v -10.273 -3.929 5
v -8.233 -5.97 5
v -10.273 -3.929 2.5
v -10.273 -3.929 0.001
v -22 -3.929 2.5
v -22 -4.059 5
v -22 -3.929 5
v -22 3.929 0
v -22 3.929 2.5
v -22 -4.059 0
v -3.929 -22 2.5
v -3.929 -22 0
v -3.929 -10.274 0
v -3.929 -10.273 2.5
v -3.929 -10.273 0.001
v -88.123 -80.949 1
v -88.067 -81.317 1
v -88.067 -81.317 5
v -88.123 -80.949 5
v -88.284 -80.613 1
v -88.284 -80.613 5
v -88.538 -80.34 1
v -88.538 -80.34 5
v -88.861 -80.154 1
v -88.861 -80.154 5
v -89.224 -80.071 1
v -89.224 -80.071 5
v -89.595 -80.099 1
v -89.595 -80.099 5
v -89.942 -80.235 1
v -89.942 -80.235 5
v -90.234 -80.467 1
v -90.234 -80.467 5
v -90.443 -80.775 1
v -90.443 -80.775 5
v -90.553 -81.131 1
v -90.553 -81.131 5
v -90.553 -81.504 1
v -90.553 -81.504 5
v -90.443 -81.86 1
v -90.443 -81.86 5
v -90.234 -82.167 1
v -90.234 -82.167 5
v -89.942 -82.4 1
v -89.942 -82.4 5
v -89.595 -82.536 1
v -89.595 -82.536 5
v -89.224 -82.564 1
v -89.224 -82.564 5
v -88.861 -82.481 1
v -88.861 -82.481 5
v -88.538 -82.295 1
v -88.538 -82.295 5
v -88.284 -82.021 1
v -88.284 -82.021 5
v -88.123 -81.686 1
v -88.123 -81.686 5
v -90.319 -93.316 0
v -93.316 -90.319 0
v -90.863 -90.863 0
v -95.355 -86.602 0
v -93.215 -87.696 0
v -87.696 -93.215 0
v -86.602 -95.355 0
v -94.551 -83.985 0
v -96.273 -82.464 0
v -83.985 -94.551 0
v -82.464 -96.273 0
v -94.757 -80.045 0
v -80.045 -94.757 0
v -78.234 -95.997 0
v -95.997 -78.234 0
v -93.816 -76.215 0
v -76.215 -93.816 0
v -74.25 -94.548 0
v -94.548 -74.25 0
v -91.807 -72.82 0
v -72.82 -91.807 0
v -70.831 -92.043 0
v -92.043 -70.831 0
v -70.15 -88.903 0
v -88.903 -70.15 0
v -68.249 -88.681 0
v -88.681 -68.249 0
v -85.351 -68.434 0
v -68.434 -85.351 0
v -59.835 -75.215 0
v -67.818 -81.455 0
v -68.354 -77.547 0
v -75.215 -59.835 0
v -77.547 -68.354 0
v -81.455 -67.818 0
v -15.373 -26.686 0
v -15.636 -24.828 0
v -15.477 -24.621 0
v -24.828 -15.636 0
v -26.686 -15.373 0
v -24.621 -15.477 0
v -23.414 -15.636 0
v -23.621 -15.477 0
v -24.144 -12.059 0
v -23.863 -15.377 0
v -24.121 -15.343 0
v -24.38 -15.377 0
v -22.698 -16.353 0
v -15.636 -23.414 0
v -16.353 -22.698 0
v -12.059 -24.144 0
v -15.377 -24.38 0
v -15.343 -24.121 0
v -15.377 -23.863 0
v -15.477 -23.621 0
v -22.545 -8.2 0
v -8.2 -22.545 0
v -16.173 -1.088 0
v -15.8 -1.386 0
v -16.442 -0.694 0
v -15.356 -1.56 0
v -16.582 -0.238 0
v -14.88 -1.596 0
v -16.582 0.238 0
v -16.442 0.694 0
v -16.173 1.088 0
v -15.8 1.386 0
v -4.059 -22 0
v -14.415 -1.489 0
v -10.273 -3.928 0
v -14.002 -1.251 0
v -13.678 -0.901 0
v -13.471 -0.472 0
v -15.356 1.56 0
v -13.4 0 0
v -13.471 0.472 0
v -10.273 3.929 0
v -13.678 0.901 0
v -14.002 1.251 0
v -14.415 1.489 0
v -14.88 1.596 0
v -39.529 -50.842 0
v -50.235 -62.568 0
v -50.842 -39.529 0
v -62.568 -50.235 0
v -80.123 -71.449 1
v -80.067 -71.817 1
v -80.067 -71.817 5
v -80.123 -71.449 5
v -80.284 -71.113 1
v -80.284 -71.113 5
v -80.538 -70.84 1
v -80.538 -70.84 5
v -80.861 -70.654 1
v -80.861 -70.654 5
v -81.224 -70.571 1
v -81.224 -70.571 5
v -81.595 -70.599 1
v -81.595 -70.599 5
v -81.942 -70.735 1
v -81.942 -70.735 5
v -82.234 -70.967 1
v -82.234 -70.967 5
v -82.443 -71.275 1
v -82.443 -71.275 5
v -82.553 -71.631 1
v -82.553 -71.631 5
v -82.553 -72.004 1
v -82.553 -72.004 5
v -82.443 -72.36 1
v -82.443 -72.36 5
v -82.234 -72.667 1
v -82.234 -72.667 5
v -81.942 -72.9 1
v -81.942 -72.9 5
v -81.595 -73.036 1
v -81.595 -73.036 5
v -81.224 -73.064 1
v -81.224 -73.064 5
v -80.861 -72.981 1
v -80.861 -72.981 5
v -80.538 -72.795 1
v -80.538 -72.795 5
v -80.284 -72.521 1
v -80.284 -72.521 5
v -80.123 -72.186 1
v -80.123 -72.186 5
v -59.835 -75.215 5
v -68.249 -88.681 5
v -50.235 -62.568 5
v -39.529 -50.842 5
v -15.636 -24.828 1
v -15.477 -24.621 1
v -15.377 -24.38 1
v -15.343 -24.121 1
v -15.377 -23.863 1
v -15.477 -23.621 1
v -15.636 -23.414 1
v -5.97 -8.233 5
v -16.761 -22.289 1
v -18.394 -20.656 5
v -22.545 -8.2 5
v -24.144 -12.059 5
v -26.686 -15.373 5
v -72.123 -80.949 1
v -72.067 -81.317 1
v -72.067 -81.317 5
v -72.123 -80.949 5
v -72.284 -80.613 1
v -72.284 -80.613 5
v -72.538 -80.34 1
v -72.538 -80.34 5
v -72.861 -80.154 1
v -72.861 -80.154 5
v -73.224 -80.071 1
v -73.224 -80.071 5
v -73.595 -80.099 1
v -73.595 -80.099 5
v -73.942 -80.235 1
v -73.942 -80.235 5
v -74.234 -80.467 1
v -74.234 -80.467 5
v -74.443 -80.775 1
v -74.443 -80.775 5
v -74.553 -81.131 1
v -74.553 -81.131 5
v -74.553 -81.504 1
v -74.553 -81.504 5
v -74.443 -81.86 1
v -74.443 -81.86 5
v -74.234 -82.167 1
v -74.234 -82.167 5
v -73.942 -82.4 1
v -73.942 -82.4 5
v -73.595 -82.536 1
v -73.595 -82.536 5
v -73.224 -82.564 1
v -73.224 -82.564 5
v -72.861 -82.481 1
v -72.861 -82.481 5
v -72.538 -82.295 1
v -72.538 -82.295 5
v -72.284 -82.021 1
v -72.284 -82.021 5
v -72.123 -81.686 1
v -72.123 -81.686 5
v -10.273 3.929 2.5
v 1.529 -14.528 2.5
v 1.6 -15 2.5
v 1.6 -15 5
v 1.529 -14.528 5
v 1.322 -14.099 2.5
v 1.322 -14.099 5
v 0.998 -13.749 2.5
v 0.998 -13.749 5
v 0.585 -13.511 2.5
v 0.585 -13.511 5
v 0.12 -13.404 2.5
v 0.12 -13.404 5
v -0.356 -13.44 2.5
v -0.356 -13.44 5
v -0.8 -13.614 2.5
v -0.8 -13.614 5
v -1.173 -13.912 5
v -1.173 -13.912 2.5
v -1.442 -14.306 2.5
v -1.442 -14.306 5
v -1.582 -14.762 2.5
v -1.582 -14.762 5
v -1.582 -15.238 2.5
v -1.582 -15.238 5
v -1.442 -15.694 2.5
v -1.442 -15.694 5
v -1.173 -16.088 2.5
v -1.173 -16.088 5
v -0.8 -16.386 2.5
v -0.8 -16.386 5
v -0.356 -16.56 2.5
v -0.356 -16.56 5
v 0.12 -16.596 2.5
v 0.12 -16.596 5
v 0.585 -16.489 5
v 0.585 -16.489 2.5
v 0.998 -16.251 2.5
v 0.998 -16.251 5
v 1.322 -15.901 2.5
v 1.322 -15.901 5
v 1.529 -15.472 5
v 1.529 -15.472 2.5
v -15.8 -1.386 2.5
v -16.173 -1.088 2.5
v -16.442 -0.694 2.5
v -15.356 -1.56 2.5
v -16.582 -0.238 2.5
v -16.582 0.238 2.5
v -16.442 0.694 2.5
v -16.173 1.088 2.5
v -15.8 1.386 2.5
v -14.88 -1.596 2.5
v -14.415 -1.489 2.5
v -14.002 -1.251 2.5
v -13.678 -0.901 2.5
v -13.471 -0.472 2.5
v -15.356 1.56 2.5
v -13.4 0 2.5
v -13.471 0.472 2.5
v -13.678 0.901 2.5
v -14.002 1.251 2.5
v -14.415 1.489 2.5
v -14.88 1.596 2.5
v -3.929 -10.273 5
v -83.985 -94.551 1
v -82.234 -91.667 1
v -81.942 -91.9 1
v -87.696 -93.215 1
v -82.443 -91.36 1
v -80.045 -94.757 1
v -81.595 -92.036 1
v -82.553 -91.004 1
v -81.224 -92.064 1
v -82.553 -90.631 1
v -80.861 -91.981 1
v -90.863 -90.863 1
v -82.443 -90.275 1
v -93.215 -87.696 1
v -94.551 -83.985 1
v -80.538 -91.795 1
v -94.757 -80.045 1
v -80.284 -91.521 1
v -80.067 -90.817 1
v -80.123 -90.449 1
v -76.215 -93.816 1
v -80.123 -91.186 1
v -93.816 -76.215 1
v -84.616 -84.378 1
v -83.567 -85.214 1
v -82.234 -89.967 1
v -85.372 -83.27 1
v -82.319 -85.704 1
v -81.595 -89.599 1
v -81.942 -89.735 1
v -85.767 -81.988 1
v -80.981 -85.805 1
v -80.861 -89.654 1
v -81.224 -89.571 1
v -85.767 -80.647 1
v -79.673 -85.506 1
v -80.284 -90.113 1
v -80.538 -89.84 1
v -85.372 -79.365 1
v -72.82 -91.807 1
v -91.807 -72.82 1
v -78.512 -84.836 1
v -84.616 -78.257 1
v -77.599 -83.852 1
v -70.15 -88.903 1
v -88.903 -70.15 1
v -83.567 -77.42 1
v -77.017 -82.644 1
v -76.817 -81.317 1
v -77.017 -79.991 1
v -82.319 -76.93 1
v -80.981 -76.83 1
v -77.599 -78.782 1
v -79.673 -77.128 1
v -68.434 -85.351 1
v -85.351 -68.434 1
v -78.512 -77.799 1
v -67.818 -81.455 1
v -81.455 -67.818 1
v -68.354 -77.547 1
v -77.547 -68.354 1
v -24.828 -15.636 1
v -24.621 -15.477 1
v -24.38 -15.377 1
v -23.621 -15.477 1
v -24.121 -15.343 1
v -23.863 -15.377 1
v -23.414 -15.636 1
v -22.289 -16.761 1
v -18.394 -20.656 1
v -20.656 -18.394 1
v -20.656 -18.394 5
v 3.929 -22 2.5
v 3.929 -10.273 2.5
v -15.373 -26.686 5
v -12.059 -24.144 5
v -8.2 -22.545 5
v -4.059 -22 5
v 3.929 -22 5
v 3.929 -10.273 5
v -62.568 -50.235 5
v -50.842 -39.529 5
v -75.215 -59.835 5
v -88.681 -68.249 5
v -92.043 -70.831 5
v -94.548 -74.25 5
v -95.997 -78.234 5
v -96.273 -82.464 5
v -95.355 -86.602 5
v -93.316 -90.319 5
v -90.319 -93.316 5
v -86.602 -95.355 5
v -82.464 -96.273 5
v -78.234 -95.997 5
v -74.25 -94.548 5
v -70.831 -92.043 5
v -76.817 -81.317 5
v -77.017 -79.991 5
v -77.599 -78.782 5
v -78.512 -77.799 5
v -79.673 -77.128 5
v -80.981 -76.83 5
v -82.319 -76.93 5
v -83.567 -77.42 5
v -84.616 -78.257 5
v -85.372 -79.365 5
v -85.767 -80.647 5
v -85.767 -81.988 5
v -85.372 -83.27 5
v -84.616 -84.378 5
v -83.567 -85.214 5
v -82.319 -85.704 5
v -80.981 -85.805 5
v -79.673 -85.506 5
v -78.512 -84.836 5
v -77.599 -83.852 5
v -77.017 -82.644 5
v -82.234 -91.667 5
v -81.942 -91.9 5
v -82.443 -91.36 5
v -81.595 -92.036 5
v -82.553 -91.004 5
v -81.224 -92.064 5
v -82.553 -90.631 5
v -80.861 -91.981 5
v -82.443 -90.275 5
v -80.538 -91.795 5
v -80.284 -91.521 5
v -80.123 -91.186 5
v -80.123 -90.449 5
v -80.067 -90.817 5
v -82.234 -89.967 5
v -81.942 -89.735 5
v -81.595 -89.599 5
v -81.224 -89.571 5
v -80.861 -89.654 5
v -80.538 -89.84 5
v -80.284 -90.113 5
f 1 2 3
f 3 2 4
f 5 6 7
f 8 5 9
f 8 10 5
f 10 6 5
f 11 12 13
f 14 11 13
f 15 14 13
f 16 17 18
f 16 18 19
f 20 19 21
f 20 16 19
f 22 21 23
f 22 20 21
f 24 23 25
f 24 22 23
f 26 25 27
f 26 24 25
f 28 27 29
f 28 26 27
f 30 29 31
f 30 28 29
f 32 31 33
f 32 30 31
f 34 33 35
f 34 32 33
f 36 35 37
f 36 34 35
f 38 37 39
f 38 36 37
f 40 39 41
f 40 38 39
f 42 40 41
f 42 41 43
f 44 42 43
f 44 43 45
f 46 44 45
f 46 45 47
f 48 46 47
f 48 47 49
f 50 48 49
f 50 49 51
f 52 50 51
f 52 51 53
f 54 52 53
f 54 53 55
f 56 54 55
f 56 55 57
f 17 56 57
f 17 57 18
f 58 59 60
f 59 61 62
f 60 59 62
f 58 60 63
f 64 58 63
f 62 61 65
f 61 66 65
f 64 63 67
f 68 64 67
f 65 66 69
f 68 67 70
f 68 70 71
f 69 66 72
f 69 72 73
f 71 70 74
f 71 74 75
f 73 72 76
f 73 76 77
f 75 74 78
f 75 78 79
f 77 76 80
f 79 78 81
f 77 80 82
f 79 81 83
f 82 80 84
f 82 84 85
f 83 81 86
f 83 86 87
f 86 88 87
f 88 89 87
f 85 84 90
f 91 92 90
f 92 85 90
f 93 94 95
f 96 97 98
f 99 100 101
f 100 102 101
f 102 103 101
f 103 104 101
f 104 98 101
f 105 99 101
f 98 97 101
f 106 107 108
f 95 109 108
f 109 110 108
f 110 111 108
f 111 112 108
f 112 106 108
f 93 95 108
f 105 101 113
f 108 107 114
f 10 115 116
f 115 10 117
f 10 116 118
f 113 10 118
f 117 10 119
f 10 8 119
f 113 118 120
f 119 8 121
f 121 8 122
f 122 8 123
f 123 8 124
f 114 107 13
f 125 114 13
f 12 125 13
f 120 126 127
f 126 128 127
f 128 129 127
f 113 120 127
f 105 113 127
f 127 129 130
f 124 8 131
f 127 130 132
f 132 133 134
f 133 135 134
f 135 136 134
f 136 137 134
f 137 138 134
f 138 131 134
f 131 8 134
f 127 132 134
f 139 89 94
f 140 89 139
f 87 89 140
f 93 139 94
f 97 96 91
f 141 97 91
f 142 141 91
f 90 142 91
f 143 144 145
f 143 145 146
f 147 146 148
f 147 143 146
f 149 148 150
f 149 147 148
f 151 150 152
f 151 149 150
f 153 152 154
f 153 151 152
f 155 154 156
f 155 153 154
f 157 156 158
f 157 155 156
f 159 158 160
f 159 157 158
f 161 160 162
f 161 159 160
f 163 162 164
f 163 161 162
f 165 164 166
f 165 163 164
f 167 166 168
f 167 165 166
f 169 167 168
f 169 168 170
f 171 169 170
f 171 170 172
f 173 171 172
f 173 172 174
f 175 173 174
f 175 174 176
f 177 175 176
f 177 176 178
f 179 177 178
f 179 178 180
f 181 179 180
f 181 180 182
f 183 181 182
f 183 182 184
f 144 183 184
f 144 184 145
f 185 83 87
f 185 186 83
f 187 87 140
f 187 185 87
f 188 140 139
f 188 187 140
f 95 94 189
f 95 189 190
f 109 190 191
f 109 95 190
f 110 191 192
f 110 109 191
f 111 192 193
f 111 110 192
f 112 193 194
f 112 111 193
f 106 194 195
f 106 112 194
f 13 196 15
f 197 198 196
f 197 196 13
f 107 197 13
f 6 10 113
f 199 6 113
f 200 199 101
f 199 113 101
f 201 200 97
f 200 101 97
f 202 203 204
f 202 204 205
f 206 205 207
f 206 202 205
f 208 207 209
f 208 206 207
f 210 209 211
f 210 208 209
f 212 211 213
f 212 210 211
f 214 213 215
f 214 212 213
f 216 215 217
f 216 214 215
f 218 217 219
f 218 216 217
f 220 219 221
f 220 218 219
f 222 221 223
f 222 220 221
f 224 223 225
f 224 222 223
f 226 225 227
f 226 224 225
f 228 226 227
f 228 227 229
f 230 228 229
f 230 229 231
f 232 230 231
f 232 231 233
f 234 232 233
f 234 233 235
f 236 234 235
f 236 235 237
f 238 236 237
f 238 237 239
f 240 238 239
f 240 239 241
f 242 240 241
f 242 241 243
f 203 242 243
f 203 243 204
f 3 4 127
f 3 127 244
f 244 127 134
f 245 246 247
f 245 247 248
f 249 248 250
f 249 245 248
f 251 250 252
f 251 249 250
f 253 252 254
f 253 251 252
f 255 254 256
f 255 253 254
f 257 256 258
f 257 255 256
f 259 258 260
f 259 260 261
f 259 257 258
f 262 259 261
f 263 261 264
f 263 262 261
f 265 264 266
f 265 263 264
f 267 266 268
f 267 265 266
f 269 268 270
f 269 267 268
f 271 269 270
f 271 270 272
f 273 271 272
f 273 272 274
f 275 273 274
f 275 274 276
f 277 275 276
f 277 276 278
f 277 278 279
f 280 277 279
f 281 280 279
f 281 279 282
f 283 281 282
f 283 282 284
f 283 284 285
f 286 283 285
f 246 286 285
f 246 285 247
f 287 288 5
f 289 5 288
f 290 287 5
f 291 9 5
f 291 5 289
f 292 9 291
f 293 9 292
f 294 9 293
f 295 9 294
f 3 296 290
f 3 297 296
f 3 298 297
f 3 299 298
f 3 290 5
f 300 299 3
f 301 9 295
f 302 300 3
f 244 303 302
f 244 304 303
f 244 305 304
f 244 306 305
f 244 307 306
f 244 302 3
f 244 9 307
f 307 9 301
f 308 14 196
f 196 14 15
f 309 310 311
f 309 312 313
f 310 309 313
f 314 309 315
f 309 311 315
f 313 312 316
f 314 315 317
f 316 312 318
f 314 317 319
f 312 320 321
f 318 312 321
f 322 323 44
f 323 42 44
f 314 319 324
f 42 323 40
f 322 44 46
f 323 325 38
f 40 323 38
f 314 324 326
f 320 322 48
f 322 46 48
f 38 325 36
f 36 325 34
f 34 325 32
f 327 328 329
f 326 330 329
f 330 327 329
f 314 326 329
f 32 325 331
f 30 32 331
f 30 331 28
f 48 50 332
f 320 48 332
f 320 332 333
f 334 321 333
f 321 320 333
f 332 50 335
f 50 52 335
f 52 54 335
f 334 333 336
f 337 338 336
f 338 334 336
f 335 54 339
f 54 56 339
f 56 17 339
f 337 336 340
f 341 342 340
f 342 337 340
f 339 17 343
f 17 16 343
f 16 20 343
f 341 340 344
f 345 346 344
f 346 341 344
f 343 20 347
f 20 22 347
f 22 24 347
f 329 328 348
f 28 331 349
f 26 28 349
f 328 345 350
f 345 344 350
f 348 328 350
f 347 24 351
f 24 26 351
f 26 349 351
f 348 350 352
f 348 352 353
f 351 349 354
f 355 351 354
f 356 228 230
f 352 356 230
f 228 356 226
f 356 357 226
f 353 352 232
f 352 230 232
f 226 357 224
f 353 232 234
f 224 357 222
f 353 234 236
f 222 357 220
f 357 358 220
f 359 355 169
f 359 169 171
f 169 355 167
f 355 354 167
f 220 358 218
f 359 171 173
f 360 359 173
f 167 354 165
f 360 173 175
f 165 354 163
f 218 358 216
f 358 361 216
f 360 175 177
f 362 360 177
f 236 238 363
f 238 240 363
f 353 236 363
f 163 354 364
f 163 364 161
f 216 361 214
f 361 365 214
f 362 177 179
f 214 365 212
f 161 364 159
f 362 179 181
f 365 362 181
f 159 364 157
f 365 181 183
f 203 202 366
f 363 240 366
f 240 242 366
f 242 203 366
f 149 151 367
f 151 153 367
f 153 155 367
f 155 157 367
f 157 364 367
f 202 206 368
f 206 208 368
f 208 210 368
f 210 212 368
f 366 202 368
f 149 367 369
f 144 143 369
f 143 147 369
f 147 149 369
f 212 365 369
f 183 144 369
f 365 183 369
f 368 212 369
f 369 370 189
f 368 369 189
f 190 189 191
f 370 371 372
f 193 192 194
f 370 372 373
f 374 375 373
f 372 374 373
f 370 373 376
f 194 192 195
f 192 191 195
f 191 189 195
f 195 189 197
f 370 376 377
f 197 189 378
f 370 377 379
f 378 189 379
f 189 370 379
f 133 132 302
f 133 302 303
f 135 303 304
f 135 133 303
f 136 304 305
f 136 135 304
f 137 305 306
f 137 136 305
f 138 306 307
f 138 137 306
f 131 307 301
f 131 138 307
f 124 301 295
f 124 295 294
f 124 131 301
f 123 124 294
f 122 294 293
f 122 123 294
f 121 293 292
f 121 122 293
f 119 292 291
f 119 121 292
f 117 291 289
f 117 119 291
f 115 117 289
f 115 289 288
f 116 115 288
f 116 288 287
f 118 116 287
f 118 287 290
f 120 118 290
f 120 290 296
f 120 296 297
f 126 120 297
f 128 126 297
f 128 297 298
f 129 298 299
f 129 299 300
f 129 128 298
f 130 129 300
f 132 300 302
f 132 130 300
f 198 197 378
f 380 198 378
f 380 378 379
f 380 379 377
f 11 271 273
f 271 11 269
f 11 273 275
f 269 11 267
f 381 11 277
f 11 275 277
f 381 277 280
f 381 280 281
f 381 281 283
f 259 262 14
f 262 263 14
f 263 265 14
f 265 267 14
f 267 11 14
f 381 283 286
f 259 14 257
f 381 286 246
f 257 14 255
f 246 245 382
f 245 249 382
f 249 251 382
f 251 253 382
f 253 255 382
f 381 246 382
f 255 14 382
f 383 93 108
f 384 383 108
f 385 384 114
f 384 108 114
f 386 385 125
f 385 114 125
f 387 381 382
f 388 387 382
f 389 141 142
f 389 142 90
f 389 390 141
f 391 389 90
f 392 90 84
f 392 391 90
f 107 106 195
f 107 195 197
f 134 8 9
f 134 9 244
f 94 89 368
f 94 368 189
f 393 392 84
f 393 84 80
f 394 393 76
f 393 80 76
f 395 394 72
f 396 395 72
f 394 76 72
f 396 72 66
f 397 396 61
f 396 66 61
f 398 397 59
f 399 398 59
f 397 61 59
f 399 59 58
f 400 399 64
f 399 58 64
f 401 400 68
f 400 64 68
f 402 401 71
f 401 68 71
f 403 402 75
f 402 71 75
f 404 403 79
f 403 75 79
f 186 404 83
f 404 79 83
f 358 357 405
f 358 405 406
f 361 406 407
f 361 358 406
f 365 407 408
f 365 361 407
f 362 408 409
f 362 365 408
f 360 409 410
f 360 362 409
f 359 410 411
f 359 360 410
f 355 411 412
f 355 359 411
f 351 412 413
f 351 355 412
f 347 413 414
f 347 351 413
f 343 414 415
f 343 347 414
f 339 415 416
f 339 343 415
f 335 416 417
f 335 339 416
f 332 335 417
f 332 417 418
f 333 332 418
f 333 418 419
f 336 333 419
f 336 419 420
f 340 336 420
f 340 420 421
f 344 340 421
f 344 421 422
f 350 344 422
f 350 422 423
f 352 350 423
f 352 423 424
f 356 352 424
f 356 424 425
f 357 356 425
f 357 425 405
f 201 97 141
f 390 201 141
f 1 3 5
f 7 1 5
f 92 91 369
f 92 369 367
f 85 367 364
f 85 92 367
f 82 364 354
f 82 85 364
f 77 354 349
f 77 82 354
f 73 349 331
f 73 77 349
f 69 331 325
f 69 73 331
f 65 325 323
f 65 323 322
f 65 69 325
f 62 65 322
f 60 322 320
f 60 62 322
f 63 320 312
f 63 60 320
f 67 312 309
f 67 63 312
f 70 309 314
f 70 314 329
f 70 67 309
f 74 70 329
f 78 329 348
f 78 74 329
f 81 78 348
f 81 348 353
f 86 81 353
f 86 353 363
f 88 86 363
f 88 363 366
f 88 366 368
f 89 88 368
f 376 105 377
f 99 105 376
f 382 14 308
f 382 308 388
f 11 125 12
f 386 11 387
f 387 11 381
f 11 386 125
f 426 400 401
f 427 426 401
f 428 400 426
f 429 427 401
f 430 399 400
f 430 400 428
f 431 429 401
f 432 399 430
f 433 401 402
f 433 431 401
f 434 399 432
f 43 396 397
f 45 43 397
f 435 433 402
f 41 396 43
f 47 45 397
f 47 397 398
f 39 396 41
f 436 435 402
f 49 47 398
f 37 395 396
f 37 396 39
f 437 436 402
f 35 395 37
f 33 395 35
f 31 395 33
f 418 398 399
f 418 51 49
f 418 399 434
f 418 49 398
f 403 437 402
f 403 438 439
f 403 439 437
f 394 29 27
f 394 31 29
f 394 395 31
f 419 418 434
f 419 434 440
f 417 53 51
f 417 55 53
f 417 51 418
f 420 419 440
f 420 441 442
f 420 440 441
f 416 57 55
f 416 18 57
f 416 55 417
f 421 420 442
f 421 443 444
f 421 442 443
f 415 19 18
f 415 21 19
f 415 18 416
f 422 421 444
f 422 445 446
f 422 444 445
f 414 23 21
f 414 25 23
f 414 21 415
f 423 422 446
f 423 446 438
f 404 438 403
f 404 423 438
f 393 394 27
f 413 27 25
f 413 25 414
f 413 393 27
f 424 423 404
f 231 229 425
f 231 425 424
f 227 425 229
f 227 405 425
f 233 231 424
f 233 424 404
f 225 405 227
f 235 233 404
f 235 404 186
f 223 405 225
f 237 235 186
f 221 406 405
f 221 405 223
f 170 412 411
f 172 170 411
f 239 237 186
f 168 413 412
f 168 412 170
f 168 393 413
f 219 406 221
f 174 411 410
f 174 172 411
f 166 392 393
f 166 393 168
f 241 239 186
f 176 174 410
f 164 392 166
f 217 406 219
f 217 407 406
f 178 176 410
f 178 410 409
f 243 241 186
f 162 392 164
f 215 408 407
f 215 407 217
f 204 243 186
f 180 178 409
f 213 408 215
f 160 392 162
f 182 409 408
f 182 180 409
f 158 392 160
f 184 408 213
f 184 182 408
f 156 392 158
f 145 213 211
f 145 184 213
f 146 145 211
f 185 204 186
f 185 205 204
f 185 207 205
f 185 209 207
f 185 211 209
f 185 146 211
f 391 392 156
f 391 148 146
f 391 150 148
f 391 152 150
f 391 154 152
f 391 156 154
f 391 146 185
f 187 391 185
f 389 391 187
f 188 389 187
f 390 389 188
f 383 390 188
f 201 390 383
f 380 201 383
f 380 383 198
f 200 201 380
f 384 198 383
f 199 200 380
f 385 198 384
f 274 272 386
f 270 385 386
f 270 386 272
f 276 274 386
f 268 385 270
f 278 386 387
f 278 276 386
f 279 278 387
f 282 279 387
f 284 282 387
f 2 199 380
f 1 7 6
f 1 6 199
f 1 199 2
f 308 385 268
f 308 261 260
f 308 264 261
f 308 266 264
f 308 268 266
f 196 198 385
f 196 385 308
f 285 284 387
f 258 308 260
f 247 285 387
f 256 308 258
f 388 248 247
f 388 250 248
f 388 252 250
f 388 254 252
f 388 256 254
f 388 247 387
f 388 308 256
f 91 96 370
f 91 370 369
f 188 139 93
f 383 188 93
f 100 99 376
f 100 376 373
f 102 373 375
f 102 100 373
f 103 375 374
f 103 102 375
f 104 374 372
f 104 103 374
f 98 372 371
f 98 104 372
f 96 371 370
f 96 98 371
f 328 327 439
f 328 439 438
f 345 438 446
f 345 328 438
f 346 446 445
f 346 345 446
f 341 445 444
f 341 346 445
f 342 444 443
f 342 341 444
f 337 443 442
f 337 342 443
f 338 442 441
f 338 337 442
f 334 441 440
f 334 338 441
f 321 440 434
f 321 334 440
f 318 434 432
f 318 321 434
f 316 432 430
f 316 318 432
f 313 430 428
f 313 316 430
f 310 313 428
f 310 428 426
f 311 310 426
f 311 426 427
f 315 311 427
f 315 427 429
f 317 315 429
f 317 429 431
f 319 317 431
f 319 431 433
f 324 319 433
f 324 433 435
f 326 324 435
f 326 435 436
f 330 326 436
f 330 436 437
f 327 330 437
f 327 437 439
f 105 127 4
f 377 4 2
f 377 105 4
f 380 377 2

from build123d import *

# Parameters (mm, degrees)
F0_R     = 1.25
F0_R_2   = 4.5
F1_DEPTH = 5
F0_W     = 11.7265549134
F0_H     = 7.858
F0_R_3   = 1.6
F2_DEPTH = 2.5
F0_W_2   = 7.858
F0_H_2   = 11.7265549134
F3_DEPTH = 5
F4_DEPTH = 2.5
F5_DEPTH = 1
F6_R     = 175
F8_DEPTH = 25


# Not quite as in the source:
# - a feature names something its author has since deleted; it is built from what else it names


with BuildPart() as f1:
    # F0 (on Top) → F1 (new body)
    with BuildSketch(Plane.XY):
        with BuildLine():
            Line((-10.2734450866, -3.929), (-22, -3.929))
            Line((-22, -3.929), (-22, -4.058874503))
            ThreePointArc((-22, -4.058874503), (-23.2179274798, -10.1818094209), (-26.686291501, -15.372583002))
            Line((-26.686291501, -15.372583002), (-78.0019548635, -66.6882463645))
            ThreePointArc((-78.0019548635, -66.6882463645), (-91.9238815543, -91.9238815543), (-66.6882463645, -78.0019548635))
            Line((-66.6882463645, -78.0019548635), (-15.372583002, -26.686291501))
            ThreePointArc((-15.372583002, -26.686291501), (-10.1818094209, -23.2179274798), (-4.058874503, -22))
            Line((-4.058874503, -22), (-3.929, -22))
            Line((-3.929, -22), (-3.929, -10.2734450866))
            Line((-3.929, -10.2734450866), (-5.9698516934, -8.2325933932))
            Line((-5.9698516934, -8.2325933932), (-18.3937554159, -20.6564971157))
            Line((-18.3937554159, -20.6564971157), (-15.6360389693, -23.4142135624))
            ThreePointArc((-15.6360389693, -23.4142135624), (-15.3431457505, -24.1213203436), (-15.6360389693, -24.8284271247))
            Line((-15.6360389693, -24.8284271247), (-68.3544854934, -77.5468736488))
            ThreePointArc((-68.3544854934, -77.5468736488), (-90.8632213825, -90.8632213825), (-77.5468736488, -68.3544854934))
            Line((-77.5468736488, -68.3544854934), (-24.8284271247, -15.6360389693))
            ThreePointArc((-24.8284271247, -15.6360389693), (-24.1213203436, -15.3431457505), (-23.4142135624, -15.6360389693))
            Line((-23.4142135624, -15.6360389693), (-20.6564971157, -18.3937554159))
            Line((-20.6564971157, -18.3937554159), (-8.2325933932, -5.9698516934))
            Line((-8.2325933932, -5.9698516934), (-10.2734450866, -3.929))
        make_face()
        with BuildLine():
            Line((-18.3937554159, -20.6564971157), (-20.6564971157, -18.3937554159))
            Line((-20.6564971157, -18.3937554159), (-23.4142135624, -15.6360389693))
            ThreePointArc((-23.4142135624, -15.6360389693), (-24.1213203436, -15.3431457505), (-24.8284271247, -15.6360389693))
            Line((-24.8284271247, -15.6360389693), (-77.5468736488, -68.3544854934))
            ThreePointArc((-77.5468736488, -68.3544854934), (-90.8632213825, -90.8632213825), (-68.3544854934, -77.5468736488))
            Line((-68.3544854934, -77.5468736488), (-15.6360389693, -24.8284271247))
            ThreePointArc((-15.6360389693, -24.8284271247), (-15.3431457505, -24.1213203436), (-15.6360389693, -23.4142135624))
            Line((-15.6360389693, -23.4142135624), (-18.3937554159, -20.6564971157))
        make_face()
        with Locations((-81.3172798365, -90.8172798365)):
            Circle(F0_R, mode=Mode.SUBTRACT)
        with Locations((-89.3172798365, -81.3172798365)):
            Circle(F0_R, mode=Mode.SUBTRACT)
        with Locations((-81.3172798365, -81.3172798365)):
            Circle(F0_R_2, mode=Mode.SUBTRACT)
        with Locations((-73.3172798365, -81.3172798365)):
            Circle(F0_R, mode=Mode.SUBTRACT)
        with Locations((-81.3172798365, -71.8172798365)):
            Circle(F0_R, mode=Mode.SUBTRACT)
    extrude(amount=F1_DEPTH)

    # F0 (on Top) → F2 (join)
    with BuildSketch(Plane.XY):
        with Locations((-16.1367225433, 0)):
            Rectangle(F0_W, F0_H)
        with Locations((-15, 0)):
            Circle(F0_R_3, mode=Mode.SUBTRACT)
    extrude(amount=F2_DEPTH)

    # F0 (on Top) → F3 (join)
    with BuildSketch(Plane.XY):
        with Locations((0, -16.1367225433)):
            Rectangle(F0_W_2, F0_H_2)
        with Locations((0, -15)):
            Circle(F0_R_3, mode=Mode.SUBTRACT)
    extrude(amount=F3_DEPTH)

    # F0 (on Top) → F4 (cut)
    with BuildSketch(Plane.XY):
        with Locations((0, -16.1367225433)):
            Rectangle(F0_W_2, F0_H_2)
        with Locations((0, -15)):
            Circle(F0_R_3, mode=Mode.SUBTRACT)
    extrude(amount=F4_DEPTH, mode=Mode.SUBTRACT)

    # F0 (on Top) → F5 (cut)
    with BuildSketch(Plane.XY):
        with BuildLine():
            Line((-18.3937554159, -20.6564971157), (-20.6564971157, -18.3937554159))
            Line((-20.6564971157, -18.3937554159), (-23.4142135624, -15.6360389693))
            ThreePointArc((-23.4142135624, -15.6360389693), (-24.1213203436, -15.3431457505), (-24.8284271247, -15.6360389693))
            Line((-24.8284271247, -15.6360389693), (-77.5468736488, -68.3544854934))
            ThreePointArc((-77.5468736488, -68.3544854934), (-90.8632213825, -90.8632213825), (-68.3544854934, -77.5468736488))
            Line((-68.3544854934, -77.5468736488), (-15.6360389693, -24.8284271247))
            ThreePointArc((-15.6360389693, -24.8284271247), (-15.3431457505, -24.1213203436), (-15.6360389693, -23.4142135624))
            Line((-15.6360389693, -23.4142135624), (-18.3937554159, -20.6564971157))
        make_face()
        with Locations((-81.3172798365, -90.8172798365)):
            Circle(F0_R, mode=Mode.SUBTRACT)
        with Locations((-89.3172798365, -81.3172798365)):
            Circle(F0_R, mode=Mode.SUBTRACT)
        with Locations((-81.3172798365, -81.3172798365)):
            Circle(F0_R_2, mode=Mode.SUBTRACT)
        with Locations((-73.3172798365, -81.3172798365)):
            Circle(F0_R, mode=Mode.SUBTRACT)
        with Locations((-81.3172798365, -71.8172798365)):
            Circle(F0_R, mode=Mode.SUBTRACT)
    extrude(amount=F5_DEPTH, mode=Mode.SUBTRACT)

    # F6
    f6_edges = [f1.edges().sort_by_distance(p)[0] for p in [
        (-66.688246, -78.001955, 2.5),
        (-78.001955, -66.688246, 2.5),
    ]]
    fillet(f6_edges, radius=F6_R)

    # F7 (on face) → F8 (cut)
    with BuildSketch(Plane(origin=(-19.5251262658, -19.5251262658, 0), x_dir=(-0.7071067812, 0.7071067812, 0), z_dir=(0.7071067812, 0.7071067812, 0))):
        Polygon((4.4867513459, 0), (1.6, 5), (1.6, 1), (-1.6, 1), (-1.6, 5), (-4.4867513459, 0), align=None)
    extrude(amount=F8_DEPTH, mode=Mode.SUBTRACT)


solid = f1.part
